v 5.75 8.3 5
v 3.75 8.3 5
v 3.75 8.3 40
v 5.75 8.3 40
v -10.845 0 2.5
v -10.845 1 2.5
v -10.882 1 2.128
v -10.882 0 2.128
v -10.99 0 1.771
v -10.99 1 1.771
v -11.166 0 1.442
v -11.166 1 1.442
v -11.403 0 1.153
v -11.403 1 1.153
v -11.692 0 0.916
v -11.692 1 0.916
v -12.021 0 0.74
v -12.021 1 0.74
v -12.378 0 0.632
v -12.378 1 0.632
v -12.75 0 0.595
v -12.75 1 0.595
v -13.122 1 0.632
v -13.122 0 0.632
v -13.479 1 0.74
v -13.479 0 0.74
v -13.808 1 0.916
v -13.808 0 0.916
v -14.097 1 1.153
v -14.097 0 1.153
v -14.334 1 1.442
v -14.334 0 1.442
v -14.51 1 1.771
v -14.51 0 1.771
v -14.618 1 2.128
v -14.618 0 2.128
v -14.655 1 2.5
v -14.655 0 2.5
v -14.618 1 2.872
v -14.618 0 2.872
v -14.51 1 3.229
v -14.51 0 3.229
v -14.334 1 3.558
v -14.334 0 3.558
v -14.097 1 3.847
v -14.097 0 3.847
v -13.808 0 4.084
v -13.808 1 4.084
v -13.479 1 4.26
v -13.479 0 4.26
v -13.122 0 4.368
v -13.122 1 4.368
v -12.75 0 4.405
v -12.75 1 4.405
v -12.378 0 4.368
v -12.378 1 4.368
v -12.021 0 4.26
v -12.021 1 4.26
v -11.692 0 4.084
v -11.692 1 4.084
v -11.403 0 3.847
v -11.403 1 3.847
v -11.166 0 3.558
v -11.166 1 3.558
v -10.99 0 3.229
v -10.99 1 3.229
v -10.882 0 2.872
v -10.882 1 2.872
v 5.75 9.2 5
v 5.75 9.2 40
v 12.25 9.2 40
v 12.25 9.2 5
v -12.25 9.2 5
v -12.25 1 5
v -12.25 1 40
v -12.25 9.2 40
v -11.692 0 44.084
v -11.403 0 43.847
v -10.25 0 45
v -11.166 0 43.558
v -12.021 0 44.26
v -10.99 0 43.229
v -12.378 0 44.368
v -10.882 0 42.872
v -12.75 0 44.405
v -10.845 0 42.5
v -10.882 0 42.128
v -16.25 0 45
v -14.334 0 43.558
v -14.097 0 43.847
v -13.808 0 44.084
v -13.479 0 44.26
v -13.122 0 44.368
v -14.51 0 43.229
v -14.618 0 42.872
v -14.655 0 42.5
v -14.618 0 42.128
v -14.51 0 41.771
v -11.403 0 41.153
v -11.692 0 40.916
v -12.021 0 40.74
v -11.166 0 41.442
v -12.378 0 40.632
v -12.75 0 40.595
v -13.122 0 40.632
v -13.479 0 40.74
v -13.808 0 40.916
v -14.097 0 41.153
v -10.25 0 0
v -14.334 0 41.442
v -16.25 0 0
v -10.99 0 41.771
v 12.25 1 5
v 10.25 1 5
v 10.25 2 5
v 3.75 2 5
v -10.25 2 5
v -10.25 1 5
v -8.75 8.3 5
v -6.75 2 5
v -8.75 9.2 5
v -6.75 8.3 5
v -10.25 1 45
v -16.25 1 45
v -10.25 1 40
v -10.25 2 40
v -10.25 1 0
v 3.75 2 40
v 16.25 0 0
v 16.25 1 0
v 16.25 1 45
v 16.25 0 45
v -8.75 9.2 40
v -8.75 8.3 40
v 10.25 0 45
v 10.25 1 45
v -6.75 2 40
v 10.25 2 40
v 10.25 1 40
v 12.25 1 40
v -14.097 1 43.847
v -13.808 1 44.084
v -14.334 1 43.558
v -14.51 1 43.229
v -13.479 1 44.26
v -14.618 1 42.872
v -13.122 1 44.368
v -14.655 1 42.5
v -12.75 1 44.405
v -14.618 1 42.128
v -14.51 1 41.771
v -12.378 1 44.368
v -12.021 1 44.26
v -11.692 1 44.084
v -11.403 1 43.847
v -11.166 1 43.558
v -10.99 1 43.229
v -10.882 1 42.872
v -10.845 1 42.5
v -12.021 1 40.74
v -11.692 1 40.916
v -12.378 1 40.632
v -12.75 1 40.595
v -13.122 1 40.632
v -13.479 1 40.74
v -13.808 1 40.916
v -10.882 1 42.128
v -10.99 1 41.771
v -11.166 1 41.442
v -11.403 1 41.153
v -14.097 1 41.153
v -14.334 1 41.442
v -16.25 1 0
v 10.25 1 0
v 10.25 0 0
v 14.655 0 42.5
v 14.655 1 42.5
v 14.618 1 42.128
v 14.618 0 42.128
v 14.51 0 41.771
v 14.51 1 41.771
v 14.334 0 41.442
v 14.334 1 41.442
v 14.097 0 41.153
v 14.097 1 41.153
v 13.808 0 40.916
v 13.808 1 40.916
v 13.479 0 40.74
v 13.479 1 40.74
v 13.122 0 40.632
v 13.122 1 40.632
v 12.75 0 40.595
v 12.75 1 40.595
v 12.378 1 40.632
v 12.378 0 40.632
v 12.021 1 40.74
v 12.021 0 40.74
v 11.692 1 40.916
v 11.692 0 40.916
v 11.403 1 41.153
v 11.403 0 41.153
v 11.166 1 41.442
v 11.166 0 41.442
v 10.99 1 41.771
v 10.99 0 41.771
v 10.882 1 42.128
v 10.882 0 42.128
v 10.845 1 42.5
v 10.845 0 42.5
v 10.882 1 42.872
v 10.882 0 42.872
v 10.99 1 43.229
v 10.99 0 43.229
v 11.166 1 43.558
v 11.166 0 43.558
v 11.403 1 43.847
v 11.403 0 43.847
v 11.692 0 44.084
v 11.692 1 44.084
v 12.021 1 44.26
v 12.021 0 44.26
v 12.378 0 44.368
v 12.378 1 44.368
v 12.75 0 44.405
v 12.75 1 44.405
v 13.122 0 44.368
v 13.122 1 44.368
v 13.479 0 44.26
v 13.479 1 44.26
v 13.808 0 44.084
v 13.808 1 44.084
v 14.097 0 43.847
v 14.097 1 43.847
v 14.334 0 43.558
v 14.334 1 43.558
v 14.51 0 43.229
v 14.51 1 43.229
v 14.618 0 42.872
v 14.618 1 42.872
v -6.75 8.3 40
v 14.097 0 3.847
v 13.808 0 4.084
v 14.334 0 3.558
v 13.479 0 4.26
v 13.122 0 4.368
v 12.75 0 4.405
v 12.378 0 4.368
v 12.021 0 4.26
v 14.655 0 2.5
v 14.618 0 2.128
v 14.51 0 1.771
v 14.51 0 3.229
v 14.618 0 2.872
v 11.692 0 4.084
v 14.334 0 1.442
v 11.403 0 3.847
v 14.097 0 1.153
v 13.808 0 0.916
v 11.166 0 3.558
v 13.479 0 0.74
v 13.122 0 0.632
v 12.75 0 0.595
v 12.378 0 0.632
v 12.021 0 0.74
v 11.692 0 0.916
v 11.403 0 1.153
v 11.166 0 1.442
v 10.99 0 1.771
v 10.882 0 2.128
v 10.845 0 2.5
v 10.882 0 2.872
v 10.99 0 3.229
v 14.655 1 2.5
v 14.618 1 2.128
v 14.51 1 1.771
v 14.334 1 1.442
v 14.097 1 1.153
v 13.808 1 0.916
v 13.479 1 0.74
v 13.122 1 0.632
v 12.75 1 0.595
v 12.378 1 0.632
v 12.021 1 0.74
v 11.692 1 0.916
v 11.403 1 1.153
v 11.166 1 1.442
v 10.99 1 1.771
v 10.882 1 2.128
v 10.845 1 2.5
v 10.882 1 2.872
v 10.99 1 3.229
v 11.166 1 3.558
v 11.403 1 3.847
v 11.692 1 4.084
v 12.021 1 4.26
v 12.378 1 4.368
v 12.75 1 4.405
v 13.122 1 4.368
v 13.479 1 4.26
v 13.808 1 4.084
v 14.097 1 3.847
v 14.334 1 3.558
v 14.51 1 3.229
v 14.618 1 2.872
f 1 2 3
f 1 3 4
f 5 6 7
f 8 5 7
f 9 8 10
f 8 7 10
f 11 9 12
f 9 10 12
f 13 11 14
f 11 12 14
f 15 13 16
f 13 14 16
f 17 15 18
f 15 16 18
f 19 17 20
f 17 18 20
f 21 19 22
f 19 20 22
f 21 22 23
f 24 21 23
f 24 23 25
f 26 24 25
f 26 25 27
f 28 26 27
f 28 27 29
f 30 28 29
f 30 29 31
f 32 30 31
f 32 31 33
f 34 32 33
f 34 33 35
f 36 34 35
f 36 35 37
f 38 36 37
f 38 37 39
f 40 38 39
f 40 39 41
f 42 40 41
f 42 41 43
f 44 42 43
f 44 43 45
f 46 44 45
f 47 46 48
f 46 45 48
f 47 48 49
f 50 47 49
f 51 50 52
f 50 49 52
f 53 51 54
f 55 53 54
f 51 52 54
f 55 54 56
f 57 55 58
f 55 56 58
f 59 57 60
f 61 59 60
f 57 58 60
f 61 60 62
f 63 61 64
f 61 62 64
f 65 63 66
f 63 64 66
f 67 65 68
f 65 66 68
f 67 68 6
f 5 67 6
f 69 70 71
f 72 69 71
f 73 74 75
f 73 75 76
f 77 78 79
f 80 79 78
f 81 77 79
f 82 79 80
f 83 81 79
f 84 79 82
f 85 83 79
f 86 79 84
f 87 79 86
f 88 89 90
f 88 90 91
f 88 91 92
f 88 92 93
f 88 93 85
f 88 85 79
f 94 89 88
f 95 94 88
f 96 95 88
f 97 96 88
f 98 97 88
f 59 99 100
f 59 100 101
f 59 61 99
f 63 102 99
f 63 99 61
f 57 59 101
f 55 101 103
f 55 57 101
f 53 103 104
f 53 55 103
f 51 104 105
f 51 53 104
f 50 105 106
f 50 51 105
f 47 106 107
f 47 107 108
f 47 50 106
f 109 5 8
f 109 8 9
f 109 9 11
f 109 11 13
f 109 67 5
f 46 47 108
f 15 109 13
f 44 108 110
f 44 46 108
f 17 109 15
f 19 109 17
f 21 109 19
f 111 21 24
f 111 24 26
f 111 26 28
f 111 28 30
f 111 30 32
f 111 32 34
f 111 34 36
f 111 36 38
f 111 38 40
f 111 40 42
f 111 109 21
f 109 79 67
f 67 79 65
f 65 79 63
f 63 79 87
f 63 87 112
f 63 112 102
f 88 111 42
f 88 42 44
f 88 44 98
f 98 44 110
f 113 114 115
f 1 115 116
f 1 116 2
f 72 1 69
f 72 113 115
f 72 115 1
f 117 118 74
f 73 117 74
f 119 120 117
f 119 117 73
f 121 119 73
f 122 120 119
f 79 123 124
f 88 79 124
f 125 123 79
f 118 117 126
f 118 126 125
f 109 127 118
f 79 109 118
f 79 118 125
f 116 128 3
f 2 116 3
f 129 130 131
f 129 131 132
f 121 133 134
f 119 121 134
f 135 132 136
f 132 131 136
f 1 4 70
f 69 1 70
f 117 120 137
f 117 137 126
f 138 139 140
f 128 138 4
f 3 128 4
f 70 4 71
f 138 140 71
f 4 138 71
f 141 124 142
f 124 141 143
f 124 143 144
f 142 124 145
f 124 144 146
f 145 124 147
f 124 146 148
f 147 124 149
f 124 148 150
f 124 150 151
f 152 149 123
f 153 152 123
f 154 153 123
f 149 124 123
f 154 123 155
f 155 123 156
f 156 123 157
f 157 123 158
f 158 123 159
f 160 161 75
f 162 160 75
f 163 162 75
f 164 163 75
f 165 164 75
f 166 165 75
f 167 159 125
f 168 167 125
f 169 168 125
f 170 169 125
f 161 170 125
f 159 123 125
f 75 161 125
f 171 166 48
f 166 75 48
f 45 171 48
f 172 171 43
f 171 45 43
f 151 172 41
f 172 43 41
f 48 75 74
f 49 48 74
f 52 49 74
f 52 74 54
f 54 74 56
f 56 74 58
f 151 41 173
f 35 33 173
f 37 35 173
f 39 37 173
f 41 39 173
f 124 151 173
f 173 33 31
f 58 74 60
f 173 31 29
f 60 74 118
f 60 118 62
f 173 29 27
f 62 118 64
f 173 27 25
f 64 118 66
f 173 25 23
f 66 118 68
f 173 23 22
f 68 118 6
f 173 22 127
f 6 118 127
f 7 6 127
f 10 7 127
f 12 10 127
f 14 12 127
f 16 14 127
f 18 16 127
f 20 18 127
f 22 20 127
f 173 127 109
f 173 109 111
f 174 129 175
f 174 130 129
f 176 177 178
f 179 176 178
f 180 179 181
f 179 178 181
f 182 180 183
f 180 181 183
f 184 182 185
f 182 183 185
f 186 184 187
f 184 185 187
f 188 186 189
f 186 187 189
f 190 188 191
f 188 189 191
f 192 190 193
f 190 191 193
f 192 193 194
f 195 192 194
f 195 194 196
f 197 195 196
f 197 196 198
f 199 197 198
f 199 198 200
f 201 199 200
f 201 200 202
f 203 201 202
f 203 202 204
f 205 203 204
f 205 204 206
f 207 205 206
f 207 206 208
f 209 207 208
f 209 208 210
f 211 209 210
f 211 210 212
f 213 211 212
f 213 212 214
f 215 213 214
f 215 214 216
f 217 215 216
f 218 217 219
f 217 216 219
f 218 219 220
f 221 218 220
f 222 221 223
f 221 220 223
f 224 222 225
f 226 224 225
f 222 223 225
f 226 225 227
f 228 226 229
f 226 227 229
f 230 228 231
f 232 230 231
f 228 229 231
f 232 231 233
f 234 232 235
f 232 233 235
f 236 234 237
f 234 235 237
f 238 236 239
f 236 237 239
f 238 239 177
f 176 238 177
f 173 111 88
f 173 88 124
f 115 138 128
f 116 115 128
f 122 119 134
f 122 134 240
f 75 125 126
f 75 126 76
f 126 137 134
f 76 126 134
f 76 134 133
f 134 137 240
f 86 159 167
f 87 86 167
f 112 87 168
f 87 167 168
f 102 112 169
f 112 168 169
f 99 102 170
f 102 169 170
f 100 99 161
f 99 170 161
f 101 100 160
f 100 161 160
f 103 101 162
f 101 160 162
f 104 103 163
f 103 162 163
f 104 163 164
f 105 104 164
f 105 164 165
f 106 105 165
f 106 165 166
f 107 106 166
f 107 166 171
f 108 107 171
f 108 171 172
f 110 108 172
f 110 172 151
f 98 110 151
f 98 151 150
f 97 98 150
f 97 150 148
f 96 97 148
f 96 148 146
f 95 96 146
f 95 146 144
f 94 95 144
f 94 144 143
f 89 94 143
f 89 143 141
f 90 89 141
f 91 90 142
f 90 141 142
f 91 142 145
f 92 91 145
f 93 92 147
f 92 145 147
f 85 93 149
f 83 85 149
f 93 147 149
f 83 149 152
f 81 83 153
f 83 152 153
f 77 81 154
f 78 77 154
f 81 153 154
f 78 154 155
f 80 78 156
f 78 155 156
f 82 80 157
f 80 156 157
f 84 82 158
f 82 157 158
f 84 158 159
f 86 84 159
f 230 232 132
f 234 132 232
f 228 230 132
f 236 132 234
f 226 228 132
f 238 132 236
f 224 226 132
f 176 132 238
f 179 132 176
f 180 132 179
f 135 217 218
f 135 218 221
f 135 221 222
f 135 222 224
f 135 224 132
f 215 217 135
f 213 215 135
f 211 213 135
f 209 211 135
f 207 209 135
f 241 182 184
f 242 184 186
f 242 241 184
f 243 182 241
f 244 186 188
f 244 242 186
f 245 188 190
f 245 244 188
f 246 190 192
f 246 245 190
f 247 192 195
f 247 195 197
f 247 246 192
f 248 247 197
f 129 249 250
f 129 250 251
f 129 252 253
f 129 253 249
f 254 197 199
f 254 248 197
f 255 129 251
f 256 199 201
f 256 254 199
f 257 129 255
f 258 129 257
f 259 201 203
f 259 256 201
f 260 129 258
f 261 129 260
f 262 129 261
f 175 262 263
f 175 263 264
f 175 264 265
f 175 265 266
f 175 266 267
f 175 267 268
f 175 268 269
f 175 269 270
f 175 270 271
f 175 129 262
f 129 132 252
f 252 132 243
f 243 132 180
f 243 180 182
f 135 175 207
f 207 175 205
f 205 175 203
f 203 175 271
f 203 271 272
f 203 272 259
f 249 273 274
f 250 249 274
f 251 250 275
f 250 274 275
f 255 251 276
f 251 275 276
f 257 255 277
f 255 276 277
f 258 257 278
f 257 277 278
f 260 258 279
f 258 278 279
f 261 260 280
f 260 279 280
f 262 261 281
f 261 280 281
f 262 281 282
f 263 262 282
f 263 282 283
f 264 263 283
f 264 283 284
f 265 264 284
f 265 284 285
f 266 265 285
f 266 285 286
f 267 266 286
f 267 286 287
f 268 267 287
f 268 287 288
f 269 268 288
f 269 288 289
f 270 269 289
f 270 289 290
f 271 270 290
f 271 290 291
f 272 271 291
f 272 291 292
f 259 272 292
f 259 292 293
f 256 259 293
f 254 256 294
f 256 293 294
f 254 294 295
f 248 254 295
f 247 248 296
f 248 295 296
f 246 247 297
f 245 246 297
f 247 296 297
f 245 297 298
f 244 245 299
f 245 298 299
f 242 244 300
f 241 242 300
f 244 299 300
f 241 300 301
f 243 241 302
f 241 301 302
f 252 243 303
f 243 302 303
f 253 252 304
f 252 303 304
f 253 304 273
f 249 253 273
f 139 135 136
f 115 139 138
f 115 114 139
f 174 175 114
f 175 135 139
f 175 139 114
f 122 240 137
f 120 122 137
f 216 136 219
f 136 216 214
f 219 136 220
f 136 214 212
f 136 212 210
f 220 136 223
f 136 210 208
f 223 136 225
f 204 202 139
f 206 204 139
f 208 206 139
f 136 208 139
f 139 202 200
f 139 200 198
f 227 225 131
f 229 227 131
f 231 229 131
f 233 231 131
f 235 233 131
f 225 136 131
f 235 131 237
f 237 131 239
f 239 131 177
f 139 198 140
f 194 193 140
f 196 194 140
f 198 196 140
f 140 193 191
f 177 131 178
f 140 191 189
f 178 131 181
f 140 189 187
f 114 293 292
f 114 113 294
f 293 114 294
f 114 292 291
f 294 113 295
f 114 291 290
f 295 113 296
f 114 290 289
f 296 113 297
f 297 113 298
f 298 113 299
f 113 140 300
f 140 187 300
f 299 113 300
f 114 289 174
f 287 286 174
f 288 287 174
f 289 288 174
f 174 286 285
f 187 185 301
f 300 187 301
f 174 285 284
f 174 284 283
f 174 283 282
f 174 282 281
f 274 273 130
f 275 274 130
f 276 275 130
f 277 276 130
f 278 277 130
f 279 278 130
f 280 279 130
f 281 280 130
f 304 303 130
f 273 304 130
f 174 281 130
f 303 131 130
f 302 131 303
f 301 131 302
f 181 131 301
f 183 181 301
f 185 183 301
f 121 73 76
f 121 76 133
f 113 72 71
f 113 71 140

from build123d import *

# Parameters (mm, degrees)
BOSS_EXTRUDE3_DEPTH   = 45
BOSS_EXTRUDE3_2_DEPTH = 45
SKETCH4_W             = 5
SKETCH4_H             = 8.2
CUT_EXTRUDE1_DEPTH    = 29.5
SKETCH5_R             = 1.905
CUT_EXTRUDE2_DEPTH    = 2
SKETCH6_W             = 5
SKETCH6_H             = 8.2
CUT_EXTRUDE3_DEPTH    = 29.5
SKETCH7_R             = 1.905
CUT_EXTRUDE4_DEPTH    = 2


with BuildPart() as part:
    # Sketch2 → Boss-Extrude3 (new body)
    with BuildSketch(Plane.XY):
        Polygon((10.25, 0), (10.25, 2), (3.75, 2), (3.75, 8.3), (5.75, 8.3), (5.75, 9.2), (12.25, 9.2), (12.25, 1), (16.25, 1), (16.25, 0), align=None)
    extrude(amount=BOSS_EXTRUDE3_DEPTH)


with BuildPart() as body_2:
    # Sketch2 → Boss-Extrude3 2 (new body)
    with BuildSketch(Plane.XY):
        Polygon((-6.75, 8.3), (-6.75, 2), (-10.25, 2), (-10.25, 0), (-16.25, 0), (-16.25, 1), (-12.25, 1), (-12.25, 9.2), (-8.75, 9.2), (-8.75, 8.3), align=None)
    extrude(amount=BOSS_EXTRUDE3_2_DEPTH)


with BuildPart() as cut_extrude1_tool:
    # Sketch4 → Cut-Extrude1 (new body, through all)
    with BuildSketch(Plane(origin=(12.25, 0, 0), x_dir=(0, 0, -1), z_dir=(1, 0, 0))):
        with Locations((-42.5, 5.1)):
            Rectangle(SKETCH4_W, SKETCH4_H)
    extrude(amount=-CUT_EXTRUDE1_DEPTH)


with BuildPart() as part_1:
    add(part.part)

    # Cut-Extrude1: cut by cut_extrude1_tool
    add(cut_extrude1_tool.part, mode=Mode.SUBTRACT)


with BuildPart() as body_2_1:
    add(body_2.part)

    # Cut-Extrude1: cut by cut_extrude1_tool
    add(cut_extrude1_tool.part, mode=Mode.SUBTRACT)


with BuildPart() as cut_extrude2_tool:
    # Sketch5 → Cut-Extrude2 (new body, through all)
    with BuildSketch(Plane(origin=(0, 1, 0), x_dir=(1, 0, 0), z_dir=(0, 1, 0))):
        with Locations((-12.75, -42.5)):
            Circle(SKETCH5_R)
        with Locations((12.75, -42.5)):
            Circle(SKETCH5_R)
    extrude(amount=-CUT_EXTRUDE2_DEPTH)


with BuildPart() as part_2:
    add(part_1.part)

    # Cut-Extrude2: cut by cut_extrude2_tool
    add(cut_extrude2_tool.part, mode=Mode.SUBTRACT)


with BuildPart() as body_2_2:
    add(body_2_1.part)

    # Cut-Extrude2: cut by cut_extrude2_tool
    add(cut_extrude2_tool.part, mode=Mode.SUBTRACT)


with BuildPart() as cut_extrude3_tool:
    # Sketch6 → Cut-Extrude3 (new body, through all)
    with BuildSketch(Plane(origin=(12.25, 0, 0), x_dir=(0, 0, -1), z_dir=(1, 0, 0))):
        with Locations((-2.5, 5.1)):
            Rectangle(SKETCH6_W, SKETCH6_H)
    extrude(amount=-CUT_EXTRUDE3_DEPTH)


with BuildPart() as part_3:
    add(part_2.part)

    # Cut-Extrude3: cut by cut_extrude3_tool
    add(cut_extrude3_tool.part, mode=Mode.SUBTRACT)


with BuildPart() as body_2_3:
    add(body_2_2.part)

    # Cut-Extrude3: cut by cut_extrude3_tool
    add(cut_extrude3_tool.part, mode=Mode.SUBTRACT)


with BuildPart() as cut_extrude4_tool:
    # Sketch7 → Cut-Extrude4 (new body, through all)
    with BuildSketch(Plane(origin=(0, 1, 0), x_dir=(1, 0, 0), z_dir=(0, 1, 0))):
        with Locations((-12.75, -2.5)):
            Circle(SKETCH7_R)
        with Locations((12.75, -2.5)):
            Circle(SKETCH7_R)
    extrude(amount=-CUT_EXTRUDE4_DEPTH)


with BuildPart() as part_4:
    add(part_3.part)

    # Cut-Extrude4: cut by cut_extrude4_tool
    add(cut_extrude4_tool.part, mode=Mode.SUBTRACT)


with BuildPart() as body_2_4:
    add(body_2_3.part)

    # Cut-Extrude4: cut by cut_extrude4_tool
    add(cut_extrude4_tool.part, mode=Mode.SUBTRACT)


solid = Compound([part_4.part, body_2_4.part])
